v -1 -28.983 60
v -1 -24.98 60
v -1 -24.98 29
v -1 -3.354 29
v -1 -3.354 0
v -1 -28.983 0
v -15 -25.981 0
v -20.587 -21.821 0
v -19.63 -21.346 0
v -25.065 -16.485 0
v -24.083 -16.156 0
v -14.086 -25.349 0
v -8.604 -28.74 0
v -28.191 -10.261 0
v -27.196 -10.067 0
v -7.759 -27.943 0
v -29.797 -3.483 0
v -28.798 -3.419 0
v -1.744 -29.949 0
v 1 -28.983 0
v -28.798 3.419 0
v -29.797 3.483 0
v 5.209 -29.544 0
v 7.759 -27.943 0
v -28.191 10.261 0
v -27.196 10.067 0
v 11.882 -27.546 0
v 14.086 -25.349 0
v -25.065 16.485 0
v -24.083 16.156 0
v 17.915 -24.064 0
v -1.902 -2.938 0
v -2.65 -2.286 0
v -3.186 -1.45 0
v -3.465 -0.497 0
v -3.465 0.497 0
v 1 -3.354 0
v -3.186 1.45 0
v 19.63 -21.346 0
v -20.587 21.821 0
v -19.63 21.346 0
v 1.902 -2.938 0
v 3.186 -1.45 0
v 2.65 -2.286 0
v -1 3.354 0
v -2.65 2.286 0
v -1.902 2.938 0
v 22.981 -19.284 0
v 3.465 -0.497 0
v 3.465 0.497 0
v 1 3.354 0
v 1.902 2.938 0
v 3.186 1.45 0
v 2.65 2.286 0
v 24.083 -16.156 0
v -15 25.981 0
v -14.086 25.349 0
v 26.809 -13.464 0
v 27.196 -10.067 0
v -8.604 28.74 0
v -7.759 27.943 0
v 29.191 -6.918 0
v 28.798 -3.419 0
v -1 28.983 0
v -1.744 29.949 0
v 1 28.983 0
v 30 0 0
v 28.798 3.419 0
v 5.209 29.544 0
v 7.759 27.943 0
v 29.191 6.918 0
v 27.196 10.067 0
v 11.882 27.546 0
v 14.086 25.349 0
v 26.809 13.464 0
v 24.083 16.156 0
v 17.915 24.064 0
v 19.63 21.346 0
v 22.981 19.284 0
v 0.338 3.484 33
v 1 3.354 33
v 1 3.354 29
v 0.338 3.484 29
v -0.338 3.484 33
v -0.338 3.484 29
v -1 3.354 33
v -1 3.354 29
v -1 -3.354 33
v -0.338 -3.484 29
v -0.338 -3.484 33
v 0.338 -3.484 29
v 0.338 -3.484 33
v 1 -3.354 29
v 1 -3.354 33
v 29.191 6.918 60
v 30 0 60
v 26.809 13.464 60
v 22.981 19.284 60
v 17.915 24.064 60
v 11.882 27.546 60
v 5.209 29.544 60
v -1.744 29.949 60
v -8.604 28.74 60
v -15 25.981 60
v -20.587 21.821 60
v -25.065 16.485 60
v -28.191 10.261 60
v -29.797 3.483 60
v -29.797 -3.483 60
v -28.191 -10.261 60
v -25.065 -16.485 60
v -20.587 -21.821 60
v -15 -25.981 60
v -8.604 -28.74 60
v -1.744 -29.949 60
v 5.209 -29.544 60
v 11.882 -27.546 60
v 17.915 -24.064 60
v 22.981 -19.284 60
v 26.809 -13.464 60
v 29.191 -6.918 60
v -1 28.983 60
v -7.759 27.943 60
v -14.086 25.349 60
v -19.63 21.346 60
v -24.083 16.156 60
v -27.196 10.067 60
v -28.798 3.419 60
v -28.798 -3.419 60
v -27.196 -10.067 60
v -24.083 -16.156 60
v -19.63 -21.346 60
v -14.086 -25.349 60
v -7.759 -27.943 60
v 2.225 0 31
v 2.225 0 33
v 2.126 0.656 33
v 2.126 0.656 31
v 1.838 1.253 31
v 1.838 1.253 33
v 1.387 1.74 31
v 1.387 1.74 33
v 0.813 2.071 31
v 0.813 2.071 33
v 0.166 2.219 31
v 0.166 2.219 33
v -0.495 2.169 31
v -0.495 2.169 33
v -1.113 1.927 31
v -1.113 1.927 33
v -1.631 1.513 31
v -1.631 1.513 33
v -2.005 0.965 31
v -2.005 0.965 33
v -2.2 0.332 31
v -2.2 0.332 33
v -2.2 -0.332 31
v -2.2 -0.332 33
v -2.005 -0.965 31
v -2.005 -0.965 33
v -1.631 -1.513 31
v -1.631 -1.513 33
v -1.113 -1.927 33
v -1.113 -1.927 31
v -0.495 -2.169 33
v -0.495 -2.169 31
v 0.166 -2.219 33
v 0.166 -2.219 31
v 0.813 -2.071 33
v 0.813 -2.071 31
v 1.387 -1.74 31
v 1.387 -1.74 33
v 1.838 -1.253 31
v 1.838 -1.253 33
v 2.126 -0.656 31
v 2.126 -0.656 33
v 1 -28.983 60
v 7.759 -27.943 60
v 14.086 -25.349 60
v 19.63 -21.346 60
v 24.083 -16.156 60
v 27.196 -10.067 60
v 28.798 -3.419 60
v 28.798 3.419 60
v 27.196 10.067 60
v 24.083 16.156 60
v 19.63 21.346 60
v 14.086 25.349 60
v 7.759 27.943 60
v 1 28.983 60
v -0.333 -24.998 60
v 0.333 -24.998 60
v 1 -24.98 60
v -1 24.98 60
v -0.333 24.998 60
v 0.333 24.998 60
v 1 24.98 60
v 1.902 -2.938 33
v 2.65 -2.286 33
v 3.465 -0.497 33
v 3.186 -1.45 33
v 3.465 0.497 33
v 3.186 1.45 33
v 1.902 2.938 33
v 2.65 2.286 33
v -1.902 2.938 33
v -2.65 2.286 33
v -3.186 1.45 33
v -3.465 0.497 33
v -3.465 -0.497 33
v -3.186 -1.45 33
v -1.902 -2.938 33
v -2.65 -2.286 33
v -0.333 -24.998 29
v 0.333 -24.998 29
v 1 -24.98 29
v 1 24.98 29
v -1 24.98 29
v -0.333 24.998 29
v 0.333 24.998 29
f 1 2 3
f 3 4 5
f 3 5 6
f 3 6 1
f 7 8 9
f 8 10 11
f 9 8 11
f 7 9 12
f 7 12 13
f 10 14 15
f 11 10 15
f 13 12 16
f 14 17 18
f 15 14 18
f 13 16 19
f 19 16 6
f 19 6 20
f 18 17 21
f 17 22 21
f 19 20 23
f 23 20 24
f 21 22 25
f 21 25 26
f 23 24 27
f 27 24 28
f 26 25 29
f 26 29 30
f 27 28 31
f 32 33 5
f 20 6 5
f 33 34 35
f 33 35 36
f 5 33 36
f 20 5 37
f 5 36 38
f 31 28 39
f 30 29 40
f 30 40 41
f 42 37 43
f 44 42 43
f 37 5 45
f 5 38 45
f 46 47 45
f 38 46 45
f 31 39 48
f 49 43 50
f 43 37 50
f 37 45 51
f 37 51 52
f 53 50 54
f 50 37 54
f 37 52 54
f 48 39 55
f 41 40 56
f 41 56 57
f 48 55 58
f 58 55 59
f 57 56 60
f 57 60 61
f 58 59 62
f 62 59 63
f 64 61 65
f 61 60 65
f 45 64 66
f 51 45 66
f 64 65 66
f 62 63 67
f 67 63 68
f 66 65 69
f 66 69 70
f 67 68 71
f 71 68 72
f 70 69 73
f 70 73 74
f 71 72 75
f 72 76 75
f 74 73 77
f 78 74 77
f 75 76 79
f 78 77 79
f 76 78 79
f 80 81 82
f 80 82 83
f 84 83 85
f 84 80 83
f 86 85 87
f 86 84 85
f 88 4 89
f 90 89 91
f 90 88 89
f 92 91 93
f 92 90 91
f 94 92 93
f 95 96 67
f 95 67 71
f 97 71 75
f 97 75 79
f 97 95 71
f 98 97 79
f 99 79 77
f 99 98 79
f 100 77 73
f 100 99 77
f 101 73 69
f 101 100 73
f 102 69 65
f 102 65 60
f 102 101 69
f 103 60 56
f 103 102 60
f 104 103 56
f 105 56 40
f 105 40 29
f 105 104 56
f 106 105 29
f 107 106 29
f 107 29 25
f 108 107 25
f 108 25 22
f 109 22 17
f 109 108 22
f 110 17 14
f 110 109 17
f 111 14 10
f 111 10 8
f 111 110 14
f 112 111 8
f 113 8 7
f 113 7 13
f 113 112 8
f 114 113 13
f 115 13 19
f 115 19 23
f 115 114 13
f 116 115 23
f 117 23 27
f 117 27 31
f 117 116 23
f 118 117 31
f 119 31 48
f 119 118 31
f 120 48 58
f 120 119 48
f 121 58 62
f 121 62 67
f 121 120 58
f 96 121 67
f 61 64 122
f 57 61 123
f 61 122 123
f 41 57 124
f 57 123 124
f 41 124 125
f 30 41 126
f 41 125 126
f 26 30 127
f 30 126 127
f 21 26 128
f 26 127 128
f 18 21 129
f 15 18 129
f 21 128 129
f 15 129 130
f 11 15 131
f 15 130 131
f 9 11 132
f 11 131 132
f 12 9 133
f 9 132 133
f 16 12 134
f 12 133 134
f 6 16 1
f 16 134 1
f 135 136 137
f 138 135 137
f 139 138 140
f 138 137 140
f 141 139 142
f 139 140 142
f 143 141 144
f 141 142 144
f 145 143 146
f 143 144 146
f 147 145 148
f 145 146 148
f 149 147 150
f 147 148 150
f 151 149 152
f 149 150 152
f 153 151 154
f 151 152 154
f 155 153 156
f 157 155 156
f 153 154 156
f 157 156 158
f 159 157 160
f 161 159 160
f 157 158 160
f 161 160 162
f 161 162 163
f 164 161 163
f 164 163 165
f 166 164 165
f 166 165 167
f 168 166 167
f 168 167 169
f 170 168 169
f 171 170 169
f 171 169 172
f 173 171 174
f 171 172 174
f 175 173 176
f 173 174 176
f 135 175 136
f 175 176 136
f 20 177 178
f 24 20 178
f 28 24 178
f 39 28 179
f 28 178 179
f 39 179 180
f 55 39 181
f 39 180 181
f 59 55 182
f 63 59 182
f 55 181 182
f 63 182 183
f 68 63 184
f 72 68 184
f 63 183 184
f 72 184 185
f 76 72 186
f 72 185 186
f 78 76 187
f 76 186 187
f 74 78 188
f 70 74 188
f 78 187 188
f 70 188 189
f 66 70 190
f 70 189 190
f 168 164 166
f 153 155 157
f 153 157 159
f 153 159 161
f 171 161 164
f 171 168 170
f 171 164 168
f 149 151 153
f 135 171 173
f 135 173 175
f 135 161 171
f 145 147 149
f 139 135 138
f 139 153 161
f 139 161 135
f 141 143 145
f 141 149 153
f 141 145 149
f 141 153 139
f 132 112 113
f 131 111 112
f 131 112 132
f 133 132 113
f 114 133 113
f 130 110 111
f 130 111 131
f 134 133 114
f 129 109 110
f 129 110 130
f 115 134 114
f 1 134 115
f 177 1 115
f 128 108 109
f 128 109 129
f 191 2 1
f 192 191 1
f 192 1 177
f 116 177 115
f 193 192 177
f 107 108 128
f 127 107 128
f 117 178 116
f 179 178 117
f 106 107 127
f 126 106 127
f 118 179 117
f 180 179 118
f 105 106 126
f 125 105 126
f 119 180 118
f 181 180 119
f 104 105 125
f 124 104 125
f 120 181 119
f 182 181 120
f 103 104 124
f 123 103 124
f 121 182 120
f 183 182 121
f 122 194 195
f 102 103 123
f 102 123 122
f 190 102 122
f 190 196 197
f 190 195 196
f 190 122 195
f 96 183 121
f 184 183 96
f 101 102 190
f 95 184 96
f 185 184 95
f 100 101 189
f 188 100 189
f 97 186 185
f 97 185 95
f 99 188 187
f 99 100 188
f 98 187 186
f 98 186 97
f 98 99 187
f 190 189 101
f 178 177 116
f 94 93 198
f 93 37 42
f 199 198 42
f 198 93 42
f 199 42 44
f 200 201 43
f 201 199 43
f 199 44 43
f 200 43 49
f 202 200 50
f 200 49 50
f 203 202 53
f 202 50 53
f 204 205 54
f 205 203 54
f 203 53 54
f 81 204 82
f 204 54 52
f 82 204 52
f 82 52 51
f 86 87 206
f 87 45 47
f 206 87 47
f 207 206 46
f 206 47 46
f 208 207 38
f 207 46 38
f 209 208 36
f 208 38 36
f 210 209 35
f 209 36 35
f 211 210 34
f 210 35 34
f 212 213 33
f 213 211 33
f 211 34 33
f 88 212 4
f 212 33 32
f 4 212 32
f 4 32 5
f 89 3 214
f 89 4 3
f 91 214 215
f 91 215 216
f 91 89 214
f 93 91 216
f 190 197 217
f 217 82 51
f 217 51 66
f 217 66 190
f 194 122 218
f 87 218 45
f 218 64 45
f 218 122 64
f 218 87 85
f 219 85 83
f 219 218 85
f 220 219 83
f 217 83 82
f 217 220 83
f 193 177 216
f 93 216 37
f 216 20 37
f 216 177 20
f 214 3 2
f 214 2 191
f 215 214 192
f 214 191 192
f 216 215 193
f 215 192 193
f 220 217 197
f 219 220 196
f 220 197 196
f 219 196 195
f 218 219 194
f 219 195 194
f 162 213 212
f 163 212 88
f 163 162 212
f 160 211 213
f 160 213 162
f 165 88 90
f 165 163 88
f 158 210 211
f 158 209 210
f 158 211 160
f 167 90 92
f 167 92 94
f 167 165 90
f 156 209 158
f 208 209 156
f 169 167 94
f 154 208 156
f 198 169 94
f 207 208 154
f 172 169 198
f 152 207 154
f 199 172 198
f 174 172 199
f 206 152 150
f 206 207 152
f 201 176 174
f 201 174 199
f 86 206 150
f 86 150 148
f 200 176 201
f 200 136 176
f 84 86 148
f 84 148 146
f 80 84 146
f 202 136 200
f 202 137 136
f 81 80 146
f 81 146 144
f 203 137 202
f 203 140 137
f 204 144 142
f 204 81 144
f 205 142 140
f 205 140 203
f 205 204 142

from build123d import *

# Parameters (mm, degrees)
BOSS_EXTRU_1_DEPTH      = 60
ESQUISSE2_R             = 30
ESQUISSE2_R_2           = 29
BOSS_EXTRU_2_DEPTH      = 60
ESQUISSE3_R             = 25
ENL_V_MAT_EXTRU_1_DEPTH = 27
ESQUISSE6_R             = 2.225
ENL_V_MAT_EXTRU_3_DEPTH = 2
ESQUISSE11_R            = 25
ESQUISSE11_R_2          = 3.5
ENL_V_MAT_EXTRU_8_DEPTH = 31


with BuildPart() as part:
    # Esquisse1 → Boss.-Extru.1 (new body)
    with BuildSketch(Plane.XY):
        with BuildLine():
            Line((1, -15.006468588), (1, -3.354101966))
            ThreePointArc((1, -3.354101966), (3.5, 0), (1, 3.354101966))
            Line((1, 3.354101966), (1, 29.5))
            Line((1, 29.5), (-1, 29.5))
            Line((-1, 29.5), (-1, 3.354101966))
            ThreePointArc((-1, 3.354101966), (-3.5, 0), (-1, -3.354101966))
            Line((-1, -3.354101966), (-1, -29.5))
            Line((-1, -29.5), (1, -29.5))
            Line((1, -29.5), (1, -15.006468588))
        make_face()
    extrude(amount=BOSS_EXTRU_1_DEPTH)

    # Esquisse2 → Boss.-Extru.2 (add)
    with BuildSketch(Plane.XY.offset(60)):
        Circle(ESQUISSE2_R)
        Circle(ESQUISSE2_R_2, mode=Mode.SUBTRACT)
    extrude(amount=-BOSS_EXTRU_2_DEPTH)

    # Esquisse3 → Enlèv. mat.-Extru.1 (cut)
    with BuildSketch(Plane.XY.offset(60)):
        Circle(ESQUISSE3_R)
    extrude(amount=-ENL_V_MAT_EXTRU_1_DEPTH, mode=Mode.SUBTRACT)

    # Esquisse6 → Enlèv. mat.-Extru.3 (cut)
    with BuildSketch(Plane.XY.offset(33)):
        Circle(ESQUISSE6_R)
    extrude(amount=-ENL_V_MAT_EXTRU_3_DEPTH, mode=Mode.SUBTRACT)

    # Esquisse11 → Enlèv. mat.-Extru.8 (cut)
    with BuildSketch(Plane.XY.offset(60)):
        Circle(ESQUISSE11_R)
        Circle(ESQUISSE11_R_2, mode=Mode.SUBTRACT)
    extrude(amount=-ENL_V_MAT_EXTRU_8_DEPTH, mode=Mode.SUBTRACT)


solid = part.part
